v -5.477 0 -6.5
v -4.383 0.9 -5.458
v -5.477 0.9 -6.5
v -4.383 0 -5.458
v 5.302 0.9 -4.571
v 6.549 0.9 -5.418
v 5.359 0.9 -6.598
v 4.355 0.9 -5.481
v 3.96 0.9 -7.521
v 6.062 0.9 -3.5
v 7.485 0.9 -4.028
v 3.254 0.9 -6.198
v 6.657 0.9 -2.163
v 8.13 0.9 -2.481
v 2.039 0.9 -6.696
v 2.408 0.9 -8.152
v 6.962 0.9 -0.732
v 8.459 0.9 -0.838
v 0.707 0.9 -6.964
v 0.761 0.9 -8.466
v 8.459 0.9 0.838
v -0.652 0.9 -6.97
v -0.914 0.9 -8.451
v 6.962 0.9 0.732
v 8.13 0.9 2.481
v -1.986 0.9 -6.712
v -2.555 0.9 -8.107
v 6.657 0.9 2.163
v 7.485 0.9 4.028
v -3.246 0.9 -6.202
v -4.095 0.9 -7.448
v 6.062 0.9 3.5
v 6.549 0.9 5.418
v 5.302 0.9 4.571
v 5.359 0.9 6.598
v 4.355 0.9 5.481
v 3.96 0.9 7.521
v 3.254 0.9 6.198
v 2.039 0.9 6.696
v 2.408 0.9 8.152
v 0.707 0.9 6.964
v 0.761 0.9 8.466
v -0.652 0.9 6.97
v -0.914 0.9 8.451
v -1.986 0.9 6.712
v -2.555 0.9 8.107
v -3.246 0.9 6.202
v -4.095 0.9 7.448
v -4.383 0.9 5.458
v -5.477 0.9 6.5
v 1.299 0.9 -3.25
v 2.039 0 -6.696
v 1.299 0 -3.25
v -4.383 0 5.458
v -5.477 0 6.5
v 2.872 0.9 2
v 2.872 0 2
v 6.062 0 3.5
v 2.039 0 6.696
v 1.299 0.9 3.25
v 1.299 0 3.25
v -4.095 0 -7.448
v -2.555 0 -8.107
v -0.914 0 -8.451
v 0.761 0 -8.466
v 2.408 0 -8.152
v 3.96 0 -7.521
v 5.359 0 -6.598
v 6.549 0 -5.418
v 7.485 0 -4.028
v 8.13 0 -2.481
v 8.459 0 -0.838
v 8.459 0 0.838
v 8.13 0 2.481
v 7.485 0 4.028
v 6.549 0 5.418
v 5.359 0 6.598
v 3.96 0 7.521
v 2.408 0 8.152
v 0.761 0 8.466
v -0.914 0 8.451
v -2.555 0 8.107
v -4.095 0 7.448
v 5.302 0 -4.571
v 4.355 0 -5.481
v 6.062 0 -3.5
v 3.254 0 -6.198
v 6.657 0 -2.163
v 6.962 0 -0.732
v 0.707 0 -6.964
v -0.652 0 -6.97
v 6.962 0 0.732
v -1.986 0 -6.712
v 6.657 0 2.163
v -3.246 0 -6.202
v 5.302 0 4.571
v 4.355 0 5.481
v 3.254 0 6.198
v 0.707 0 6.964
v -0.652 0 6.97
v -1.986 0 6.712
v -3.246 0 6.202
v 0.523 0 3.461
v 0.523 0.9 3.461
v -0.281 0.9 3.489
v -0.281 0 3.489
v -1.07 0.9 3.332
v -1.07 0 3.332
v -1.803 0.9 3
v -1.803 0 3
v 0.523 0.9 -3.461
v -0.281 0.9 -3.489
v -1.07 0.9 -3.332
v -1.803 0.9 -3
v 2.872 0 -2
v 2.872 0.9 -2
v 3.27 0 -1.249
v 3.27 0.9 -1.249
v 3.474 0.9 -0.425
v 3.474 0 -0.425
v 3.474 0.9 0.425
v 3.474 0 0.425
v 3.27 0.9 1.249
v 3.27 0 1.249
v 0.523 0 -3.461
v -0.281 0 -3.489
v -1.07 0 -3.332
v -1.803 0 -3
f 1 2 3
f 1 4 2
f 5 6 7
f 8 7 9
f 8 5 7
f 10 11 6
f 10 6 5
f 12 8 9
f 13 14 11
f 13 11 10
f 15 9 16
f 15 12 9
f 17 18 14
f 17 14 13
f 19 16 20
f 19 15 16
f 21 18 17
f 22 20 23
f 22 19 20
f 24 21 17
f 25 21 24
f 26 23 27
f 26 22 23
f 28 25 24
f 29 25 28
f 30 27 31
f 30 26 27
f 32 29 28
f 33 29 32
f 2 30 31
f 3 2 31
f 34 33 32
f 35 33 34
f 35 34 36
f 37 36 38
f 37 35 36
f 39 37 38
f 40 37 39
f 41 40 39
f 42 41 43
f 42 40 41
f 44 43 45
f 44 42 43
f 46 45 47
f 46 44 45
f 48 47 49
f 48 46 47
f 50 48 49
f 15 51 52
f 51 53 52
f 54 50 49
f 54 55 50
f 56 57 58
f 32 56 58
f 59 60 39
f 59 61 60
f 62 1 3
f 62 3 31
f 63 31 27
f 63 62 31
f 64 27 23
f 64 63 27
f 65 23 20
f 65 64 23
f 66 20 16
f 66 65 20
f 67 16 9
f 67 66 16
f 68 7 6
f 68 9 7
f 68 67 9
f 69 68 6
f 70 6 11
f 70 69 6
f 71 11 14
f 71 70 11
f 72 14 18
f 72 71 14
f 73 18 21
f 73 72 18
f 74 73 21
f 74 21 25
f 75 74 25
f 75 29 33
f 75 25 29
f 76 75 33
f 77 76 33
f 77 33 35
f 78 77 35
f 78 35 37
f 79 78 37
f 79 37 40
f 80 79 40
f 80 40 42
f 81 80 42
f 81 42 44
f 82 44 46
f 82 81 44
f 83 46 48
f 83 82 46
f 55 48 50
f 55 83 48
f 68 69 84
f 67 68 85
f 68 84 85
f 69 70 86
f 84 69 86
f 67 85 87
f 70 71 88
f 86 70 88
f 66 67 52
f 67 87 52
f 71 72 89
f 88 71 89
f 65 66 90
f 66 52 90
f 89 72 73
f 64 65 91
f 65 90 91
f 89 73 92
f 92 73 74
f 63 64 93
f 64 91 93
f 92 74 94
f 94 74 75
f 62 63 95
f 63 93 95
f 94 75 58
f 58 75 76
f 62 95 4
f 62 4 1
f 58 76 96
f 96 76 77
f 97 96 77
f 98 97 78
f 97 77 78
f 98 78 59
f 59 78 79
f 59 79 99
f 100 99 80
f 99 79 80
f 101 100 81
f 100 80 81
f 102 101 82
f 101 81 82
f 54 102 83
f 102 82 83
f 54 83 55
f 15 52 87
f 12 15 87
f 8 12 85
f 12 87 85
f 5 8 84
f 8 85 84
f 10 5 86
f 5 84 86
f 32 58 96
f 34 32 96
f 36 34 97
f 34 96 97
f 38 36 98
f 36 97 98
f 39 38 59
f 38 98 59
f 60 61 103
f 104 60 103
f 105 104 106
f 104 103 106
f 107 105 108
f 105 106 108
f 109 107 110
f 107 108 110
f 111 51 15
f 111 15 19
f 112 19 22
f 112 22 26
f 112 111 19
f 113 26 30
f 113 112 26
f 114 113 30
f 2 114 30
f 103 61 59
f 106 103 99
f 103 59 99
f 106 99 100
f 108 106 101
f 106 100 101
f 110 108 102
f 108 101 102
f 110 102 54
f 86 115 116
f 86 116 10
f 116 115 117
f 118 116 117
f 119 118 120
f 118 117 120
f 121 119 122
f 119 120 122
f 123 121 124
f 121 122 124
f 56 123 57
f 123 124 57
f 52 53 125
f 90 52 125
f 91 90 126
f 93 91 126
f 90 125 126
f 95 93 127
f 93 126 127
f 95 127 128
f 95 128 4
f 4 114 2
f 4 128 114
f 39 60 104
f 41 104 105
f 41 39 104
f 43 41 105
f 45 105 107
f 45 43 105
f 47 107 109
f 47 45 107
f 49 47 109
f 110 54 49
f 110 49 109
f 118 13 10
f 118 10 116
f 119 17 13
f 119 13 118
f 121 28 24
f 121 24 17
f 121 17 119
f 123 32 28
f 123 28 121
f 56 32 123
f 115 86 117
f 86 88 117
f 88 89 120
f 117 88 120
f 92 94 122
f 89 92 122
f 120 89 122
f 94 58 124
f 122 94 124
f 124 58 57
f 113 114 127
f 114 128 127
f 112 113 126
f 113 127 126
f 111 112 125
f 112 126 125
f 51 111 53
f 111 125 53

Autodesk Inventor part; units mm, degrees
ref_plane "YZ Plane" through (0, 0, 0) normal (1, 0, 0) x (0, 1, 0)
ref_plane "XZ Plane" through (0, 0, 0) normal (0, 1, 0) x (-1, 0, 0)
ref_plane "XY Plane" through (0, 0, 0) normal (0, 0, 1) x (1, 0, 0)
sketch "Sketch1" plane through (0, 0, 0) normal (0, 1, 0) x (-1, 0, 0)
  circle A0 centre (0, 0) radius 8.5
  circle A1 centre (0, 0) radius 3.5
  circle A2 centre (0, 0) radius 7
  line L0 (5.4772, 6.5) -> (1.8028, 3)
  line L1 (1.8028, -3) -> (5.4772, -6.5)
  line L2 (-1.299, 3.25) -> (-2.0392, 6.6964)
  line L3 (-2.8723, 2) -> (-6.0622, 3.5)
  line L4 (-2.8723, -2) -> (-6.0622, -3.5)
  line L5 (-1.299, -3.25) -> (-2.0392, -6.6964)
  dimension "d0" = 17
  dimension "d2" = 6
  dimension "d3" = 14
  dimension "d4" = 13
  dimension "d5" = 4
  dimension "d6" = 7
  dimension "d8" = 7
  dimension "d9" = 6.5
extrude "Extrusion1" add sketch "Sketch1" along normal blind 0.9 contours L0 A2 L1 A0 | L0 A1 L2 A2 | A2 L5 A1 L1 | L3 A1 L4 A2 picked at (-7.9468, 0.2439)
properties part number "7mm E-Clip"
